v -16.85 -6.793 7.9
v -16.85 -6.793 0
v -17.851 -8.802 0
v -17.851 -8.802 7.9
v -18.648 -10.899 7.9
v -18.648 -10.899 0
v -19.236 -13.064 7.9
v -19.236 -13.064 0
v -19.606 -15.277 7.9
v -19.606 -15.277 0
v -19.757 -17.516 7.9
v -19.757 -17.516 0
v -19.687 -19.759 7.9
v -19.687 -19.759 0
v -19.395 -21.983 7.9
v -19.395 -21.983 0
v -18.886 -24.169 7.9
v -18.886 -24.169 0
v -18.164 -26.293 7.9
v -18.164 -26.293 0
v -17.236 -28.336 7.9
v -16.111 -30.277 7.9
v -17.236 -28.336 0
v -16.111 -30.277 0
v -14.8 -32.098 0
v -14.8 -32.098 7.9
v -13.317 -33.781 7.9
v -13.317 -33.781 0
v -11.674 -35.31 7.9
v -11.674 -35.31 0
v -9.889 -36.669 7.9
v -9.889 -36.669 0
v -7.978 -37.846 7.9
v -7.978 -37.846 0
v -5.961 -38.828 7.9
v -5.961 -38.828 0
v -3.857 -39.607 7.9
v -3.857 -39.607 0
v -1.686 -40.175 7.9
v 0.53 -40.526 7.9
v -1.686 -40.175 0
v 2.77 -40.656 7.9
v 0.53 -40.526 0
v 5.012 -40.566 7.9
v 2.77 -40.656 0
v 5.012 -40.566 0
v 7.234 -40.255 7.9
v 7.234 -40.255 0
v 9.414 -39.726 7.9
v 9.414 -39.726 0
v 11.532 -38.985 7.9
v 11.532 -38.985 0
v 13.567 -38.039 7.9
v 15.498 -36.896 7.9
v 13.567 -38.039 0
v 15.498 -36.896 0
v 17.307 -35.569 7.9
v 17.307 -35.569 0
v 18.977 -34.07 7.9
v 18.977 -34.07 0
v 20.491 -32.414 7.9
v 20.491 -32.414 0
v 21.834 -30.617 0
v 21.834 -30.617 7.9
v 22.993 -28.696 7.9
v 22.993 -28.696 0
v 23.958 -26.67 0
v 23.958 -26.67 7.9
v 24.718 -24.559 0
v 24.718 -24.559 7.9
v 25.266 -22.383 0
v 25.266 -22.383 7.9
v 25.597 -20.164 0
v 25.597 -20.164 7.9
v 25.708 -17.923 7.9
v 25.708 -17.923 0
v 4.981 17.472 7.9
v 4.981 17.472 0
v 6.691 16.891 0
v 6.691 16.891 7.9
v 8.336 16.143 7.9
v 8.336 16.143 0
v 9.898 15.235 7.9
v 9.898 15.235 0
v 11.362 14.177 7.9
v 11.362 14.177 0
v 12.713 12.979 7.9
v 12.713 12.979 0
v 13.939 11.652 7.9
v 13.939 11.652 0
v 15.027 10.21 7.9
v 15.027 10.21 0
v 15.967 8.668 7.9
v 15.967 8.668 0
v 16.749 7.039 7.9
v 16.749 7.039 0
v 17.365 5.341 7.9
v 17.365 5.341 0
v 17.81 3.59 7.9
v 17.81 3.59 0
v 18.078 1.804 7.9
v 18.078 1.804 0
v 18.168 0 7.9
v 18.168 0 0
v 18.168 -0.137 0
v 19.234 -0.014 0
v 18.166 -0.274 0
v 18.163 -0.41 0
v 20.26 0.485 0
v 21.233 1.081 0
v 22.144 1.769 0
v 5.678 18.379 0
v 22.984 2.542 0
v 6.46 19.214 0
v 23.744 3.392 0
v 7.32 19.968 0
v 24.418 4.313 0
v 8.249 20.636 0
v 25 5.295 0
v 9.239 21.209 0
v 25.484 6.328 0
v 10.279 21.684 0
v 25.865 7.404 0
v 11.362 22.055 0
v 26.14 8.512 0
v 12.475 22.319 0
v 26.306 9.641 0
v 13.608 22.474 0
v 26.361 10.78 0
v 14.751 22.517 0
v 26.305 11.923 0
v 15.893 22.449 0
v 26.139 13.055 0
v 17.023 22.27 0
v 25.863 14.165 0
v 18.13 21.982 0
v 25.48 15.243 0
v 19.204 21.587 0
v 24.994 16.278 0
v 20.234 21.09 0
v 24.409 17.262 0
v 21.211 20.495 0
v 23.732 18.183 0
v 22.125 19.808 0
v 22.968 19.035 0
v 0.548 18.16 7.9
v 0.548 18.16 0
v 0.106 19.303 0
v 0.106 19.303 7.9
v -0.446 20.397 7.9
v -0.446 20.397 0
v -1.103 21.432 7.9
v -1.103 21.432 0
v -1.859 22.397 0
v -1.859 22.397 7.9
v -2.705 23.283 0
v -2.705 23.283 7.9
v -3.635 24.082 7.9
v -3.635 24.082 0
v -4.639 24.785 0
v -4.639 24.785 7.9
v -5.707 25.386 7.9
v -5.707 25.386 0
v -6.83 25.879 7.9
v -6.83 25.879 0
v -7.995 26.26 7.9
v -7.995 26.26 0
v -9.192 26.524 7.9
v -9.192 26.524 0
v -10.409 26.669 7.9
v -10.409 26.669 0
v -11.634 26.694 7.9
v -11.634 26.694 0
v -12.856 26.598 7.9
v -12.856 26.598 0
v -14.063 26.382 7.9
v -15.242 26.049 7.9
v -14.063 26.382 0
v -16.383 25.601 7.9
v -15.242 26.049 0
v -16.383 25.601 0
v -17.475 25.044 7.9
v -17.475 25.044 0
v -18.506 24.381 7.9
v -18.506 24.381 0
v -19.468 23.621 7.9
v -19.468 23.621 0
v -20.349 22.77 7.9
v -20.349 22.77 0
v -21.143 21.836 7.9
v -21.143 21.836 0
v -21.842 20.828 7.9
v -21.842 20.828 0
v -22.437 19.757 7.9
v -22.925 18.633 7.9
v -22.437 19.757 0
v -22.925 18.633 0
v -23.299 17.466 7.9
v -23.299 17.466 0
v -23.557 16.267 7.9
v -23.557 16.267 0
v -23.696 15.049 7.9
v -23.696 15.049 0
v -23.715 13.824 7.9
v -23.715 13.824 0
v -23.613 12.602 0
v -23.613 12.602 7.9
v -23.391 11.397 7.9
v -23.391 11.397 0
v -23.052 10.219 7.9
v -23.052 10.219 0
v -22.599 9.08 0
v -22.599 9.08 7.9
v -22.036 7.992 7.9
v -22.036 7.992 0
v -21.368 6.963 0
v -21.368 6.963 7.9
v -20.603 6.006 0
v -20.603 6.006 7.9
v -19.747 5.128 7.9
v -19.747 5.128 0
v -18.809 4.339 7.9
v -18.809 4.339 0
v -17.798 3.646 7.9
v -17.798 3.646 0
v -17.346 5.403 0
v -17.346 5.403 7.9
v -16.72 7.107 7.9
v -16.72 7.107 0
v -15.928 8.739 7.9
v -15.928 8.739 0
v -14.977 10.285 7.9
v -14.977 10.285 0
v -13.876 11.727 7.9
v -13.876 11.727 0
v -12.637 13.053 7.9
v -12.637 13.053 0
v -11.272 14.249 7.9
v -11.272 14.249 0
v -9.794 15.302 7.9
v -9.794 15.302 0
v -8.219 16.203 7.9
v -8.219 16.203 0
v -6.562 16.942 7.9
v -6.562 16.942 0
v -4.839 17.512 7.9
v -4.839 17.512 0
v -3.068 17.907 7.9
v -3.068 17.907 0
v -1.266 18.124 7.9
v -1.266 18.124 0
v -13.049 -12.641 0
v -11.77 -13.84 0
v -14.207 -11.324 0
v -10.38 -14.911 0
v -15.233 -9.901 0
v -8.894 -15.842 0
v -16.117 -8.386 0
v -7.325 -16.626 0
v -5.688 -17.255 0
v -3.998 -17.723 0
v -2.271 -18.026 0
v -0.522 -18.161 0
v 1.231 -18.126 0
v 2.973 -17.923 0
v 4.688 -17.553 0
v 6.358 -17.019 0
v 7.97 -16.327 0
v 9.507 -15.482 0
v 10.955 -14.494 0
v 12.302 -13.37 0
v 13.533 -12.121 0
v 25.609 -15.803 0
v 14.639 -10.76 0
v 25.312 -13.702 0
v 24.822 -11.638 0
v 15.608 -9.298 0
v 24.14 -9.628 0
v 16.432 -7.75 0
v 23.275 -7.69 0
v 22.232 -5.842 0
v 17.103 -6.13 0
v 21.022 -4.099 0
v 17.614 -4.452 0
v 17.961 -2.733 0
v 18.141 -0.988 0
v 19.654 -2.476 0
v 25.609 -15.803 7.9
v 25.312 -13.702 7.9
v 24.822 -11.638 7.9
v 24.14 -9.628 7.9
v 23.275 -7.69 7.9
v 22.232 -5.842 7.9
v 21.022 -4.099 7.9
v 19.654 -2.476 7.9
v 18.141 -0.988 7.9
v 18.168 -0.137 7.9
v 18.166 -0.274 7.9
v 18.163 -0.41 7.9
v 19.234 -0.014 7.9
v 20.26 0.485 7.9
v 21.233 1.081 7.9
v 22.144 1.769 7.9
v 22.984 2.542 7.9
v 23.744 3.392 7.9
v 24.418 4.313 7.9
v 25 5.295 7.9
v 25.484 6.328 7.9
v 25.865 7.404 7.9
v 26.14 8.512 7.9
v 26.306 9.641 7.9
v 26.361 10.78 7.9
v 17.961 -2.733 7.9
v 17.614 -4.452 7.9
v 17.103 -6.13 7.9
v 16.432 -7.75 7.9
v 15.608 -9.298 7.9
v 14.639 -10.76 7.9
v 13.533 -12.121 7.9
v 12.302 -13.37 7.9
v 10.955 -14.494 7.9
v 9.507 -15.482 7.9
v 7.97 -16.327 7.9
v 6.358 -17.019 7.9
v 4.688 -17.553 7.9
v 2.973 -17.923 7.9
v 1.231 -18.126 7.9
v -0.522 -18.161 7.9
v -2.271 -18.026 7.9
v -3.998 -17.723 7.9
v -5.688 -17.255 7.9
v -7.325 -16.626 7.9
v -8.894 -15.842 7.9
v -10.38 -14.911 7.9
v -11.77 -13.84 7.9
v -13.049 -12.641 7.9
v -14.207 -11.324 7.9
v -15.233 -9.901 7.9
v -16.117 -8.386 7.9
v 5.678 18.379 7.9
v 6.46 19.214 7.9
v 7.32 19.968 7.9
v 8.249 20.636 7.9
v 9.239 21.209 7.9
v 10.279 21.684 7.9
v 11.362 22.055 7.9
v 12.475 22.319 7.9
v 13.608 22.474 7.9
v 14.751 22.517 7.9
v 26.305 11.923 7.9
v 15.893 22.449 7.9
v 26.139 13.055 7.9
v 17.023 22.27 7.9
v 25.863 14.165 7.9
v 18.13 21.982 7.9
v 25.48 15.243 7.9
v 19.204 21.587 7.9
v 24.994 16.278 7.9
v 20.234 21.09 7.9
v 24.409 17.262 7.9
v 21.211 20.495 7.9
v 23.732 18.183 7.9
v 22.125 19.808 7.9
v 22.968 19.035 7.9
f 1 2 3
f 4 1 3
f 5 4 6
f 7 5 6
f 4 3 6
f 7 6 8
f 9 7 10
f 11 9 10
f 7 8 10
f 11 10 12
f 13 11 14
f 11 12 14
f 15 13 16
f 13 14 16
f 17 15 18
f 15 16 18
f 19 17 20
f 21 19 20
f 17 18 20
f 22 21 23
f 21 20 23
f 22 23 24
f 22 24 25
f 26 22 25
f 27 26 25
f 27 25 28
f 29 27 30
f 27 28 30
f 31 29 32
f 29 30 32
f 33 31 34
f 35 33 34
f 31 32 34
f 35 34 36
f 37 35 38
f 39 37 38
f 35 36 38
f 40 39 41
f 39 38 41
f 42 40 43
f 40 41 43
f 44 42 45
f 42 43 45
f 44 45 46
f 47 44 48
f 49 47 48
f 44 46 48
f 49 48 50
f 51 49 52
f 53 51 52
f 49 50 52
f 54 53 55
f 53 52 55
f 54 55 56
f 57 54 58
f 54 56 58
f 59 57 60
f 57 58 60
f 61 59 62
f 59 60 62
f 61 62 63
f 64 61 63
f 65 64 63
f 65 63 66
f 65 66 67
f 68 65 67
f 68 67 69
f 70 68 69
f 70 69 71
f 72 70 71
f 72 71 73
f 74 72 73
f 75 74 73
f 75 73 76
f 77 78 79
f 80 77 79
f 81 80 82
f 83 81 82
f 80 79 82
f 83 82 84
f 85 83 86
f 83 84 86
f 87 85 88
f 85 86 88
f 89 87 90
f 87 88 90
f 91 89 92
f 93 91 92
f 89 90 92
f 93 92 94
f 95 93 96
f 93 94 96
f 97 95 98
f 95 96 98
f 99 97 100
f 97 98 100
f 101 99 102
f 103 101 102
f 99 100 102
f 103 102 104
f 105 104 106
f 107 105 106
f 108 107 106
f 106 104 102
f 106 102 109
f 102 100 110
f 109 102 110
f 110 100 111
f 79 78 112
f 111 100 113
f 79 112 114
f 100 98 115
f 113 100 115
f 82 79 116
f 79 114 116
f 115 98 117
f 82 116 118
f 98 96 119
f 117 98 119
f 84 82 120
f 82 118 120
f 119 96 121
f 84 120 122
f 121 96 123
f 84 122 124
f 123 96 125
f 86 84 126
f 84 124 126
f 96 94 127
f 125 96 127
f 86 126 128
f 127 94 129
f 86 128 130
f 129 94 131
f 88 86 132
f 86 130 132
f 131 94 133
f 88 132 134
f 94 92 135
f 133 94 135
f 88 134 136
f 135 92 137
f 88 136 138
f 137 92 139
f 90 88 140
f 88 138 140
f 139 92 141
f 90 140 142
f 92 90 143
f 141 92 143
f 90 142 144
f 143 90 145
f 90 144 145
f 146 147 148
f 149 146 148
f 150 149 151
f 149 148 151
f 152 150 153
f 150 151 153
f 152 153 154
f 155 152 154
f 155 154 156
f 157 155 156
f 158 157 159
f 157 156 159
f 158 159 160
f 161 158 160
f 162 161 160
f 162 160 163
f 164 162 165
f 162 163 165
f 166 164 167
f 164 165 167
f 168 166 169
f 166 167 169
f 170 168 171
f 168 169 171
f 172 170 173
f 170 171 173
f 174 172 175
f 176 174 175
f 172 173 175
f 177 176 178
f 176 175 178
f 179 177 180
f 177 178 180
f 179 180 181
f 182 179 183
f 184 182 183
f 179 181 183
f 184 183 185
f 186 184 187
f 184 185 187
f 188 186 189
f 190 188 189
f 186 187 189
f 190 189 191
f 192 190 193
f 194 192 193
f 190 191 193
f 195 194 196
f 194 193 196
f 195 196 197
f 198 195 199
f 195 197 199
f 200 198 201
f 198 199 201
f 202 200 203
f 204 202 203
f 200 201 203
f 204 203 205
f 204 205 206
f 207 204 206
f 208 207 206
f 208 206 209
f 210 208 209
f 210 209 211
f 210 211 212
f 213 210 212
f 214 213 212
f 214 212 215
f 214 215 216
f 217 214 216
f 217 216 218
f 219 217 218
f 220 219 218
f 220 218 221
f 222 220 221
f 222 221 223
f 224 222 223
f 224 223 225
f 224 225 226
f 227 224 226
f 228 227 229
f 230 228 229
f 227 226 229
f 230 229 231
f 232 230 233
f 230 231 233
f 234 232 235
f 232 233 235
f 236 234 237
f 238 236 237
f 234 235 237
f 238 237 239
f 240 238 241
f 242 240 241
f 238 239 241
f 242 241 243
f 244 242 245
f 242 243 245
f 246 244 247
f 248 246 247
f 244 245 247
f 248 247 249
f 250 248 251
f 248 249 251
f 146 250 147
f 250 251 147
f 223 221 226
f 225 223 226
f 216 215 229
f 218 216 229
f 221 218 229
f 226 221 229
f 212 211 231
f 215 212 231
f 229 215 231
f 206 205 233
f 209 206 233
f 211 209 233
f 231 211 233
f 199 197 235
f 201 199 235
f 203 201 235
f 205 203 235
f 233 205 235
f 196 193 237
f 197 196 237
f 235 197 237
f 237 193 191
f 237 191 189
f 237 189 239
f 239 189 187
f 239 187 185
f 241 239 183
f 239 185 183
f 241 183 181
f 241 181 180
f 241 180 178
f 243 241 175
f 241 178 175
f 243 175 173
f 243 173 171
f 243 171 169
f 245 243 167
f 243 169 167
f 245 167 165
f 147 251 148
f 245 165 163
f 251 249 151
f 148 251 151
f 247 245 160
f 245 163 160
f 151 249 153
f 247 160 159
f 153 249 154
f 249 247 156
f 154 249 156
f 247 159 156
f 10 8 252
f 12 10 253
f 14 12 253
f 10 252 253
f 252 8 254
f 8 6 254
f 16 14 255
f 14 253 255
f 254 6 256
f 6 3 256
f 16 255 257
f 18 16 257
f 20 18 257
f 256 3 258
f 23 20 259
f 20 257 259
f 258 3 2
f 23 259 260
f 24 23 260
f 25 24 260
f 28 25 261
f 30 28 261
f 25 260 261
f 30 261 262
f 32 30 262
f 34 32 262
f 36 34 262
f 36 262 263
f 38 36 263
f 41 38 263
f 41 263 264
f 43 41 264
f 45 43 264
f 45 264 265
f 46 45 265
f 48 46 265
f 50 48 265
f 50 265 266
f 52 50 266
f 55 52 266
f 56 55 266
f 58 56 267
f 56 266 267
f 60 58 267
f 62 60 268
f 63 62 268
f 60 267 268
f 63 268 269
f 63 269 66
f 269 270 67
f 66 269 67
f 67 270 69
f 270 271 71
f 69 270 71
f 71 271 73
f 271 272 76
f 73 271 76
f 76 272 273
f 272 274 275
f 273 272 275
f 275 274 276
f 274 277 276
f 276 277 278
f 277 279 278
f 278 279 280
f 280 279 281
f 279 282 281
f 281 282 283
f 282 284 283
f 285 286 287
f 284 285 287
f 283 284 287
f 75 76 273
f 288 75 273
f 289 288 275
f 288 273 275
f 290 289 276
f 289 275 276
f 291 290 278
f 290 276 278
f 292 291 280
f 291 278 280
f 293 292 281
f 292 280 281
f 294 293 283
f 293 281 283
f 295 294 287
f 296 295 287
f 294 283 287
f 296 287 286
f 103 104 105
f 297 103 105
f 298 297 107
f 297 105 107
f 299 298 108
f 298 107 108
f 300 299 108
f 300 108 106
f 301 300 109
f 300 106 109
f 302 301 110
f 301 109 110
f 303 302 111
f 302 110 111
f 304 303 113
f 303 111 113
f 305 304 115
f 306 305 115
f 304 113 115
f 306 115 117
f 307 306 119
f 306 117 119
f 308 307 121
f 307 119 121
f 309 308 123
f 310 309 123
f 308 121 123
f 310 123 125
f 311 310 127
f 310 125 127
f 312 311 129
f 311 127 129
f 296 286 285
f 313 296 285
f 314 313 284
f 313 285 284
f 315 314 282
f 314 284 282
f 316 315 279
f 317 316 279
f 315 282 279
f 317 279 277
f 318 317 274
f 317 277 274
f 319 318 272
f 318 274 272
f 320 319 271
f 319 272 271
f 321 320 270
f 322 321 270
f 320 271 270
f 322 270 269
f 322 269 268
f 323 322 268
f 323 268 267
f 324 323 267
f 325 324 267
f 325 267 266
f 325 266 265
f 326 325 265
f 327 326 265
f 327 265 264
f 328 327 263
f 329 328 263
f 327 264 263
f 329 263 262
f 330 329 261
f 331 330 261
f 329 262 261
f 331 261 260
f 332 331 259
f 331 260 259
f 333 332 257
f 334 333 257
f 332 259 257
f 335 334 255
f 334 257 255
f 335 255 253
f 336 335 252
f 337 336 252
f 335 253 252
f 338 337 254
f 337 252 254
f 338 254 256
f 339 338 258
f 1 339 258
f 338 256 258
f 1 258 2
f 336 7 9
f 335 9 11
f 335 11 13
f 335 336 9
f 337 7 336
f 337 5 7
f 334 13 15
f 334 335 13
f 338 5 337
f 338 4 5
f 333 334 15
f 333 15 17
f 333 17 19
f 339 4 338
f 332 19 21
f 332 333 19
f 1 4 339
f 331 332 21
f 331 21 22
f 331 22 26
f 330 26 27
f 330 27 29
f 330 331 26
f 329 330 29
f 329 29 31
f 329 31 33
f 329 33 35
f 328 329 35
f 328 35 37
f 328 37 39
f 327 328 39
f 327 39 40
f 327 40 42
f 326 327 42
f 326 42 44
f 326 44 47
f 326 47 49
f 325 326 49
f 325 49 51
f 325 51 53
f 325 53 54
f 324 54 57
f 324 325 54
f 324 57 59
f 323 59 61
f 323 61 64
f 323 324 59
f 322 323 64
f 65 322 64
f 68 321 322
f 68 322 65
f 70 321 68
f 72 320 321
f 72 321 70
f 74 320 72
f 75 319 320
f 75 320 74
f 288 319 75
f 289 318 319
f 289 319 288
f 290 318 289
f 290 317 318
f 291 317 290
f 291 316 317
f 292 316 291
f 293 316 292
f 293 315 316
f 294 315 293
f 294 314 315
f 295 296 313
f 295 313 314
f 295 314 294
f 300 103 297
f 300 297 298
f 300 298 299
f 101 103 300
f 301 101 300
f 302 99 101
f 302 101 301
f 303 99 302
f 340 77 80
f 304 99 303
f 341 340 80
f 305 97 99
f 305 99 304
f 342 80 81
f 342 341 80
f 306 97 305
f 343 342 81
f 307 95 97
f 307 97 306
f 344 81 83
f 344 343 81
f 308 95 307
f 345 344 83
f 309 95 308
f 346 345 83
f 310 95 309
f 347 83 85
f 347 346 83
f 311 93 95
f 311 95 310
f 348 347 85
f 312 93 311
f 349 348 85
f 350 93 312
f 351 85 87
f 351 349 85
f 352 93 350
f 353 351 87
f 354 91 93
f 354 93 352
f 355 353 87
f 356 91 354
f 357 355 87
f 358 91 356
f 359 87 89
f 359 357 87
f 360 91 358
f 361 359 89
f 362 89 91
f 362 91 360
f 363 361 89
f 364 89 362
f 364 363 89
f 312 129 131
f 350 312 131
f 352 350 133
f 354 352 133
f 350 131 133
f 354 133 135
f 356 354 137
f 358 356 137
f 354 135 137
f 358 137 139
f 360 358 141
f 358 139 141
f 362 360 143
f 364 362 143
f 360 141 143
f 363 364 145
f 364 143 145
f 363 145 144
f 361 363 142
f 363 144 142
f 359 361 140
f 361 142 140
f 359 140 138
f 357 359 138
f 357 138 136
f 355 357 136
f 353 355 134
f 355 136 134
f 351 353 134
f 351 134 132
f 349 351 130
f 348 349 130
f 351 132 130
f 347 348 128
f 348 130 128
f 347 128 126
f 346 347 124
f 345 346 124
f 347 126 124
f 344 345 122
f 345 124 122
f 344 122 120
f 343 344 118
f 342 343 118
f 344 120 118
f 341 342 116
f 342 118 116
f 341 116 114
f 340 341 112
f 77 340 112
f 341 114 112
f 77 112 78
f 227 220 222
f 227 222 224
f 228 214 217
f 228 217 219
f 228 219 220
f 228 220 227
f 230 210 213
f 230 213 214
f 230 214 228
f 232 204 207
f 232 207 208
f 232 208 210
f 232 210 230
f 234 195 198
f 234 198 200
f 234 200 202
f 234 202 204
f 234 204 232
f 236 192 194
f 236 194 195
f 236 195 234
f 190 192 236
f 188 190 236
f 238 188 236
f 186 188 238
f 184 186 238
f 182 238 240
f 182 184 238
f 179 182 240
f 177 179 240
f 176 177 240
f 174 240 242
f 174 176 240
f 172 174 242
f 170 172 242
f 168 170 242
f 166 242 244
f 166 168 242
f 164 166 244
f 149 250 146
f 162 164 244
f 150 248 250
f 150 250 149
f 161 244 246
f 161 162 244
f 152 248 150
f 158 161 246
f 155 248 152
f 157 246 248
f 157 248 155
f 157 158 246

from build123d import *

# Parameters (mm, degrees)
F1_DEPTH = 7.9


with BuildPart() as f1:
    # F0 (on Top) → F1 (new body)
    with BuildSketch(Plane.XY):
        with BuildLine():
            ThreePointArc((-17.7984656922, 3.6461317849), (-11.2718866237, 14.2486571274), (0.5481196543, 18.1598244164))
            ThreePointArc((0.5481196543, 18.1598244164), (-18.9963226132, 24.0130243173), (-17.7984656922, 3.6461317849))
        make_face()
    extrude(amount=F1_DEPTH)


with BuildPart() as f1b:
    # F0 (on Top) → F1, piece 2 (new body)
    with BuildSketch(Plane.XY):
        with BuildLine():
            ThreePointArc((25.7077028639, -17.9231219126), (23.7300574383, -8.6489895256), (18.1411905374, -0.9883642426))
            ThreePointArc((18.1411905374, -0.9883642426), (2.9734422638, -17.9231219126), (-16.8501928605, -6.7934275999))
            ThreePointArc((-16.8501928605, -6.7934275999), (-2.778553828, -39.9176927426), (25.7077028639, -17.9231219126))
        make_face()
    extrude(amount=F1_DEPTH)


with BuildPart() as f1c:
    # F0 (on Top) → F1, piece 3 (new body)
    with BuildSketch(Plane.XY):
        with BuildLine():
            ThreePointArc((4.9810875648, 17.4719324822), (14.5013193816, 10.9449254993), (18.1680945063, 0))
            ThreePointArc((18.1680945063, 0), (18.1669359704, -0.2051717319), (18.1634605102, -0.4103172972))
            ThreePointArc((18.1634605102, -0.4103172972), (24.0924893274, 3.8443968888), (26.3611761784, 10.7804646142))
            ThreePointArc((26.3611761784, 10.7804646142), (18.1297663877, 21.9818476912), (4.9810875648, 17.4719324822))
        make_face()
    extrude(amount=F1_DEPTH)


solid = Compound([f1.part, f1b.part, f1c.part])
